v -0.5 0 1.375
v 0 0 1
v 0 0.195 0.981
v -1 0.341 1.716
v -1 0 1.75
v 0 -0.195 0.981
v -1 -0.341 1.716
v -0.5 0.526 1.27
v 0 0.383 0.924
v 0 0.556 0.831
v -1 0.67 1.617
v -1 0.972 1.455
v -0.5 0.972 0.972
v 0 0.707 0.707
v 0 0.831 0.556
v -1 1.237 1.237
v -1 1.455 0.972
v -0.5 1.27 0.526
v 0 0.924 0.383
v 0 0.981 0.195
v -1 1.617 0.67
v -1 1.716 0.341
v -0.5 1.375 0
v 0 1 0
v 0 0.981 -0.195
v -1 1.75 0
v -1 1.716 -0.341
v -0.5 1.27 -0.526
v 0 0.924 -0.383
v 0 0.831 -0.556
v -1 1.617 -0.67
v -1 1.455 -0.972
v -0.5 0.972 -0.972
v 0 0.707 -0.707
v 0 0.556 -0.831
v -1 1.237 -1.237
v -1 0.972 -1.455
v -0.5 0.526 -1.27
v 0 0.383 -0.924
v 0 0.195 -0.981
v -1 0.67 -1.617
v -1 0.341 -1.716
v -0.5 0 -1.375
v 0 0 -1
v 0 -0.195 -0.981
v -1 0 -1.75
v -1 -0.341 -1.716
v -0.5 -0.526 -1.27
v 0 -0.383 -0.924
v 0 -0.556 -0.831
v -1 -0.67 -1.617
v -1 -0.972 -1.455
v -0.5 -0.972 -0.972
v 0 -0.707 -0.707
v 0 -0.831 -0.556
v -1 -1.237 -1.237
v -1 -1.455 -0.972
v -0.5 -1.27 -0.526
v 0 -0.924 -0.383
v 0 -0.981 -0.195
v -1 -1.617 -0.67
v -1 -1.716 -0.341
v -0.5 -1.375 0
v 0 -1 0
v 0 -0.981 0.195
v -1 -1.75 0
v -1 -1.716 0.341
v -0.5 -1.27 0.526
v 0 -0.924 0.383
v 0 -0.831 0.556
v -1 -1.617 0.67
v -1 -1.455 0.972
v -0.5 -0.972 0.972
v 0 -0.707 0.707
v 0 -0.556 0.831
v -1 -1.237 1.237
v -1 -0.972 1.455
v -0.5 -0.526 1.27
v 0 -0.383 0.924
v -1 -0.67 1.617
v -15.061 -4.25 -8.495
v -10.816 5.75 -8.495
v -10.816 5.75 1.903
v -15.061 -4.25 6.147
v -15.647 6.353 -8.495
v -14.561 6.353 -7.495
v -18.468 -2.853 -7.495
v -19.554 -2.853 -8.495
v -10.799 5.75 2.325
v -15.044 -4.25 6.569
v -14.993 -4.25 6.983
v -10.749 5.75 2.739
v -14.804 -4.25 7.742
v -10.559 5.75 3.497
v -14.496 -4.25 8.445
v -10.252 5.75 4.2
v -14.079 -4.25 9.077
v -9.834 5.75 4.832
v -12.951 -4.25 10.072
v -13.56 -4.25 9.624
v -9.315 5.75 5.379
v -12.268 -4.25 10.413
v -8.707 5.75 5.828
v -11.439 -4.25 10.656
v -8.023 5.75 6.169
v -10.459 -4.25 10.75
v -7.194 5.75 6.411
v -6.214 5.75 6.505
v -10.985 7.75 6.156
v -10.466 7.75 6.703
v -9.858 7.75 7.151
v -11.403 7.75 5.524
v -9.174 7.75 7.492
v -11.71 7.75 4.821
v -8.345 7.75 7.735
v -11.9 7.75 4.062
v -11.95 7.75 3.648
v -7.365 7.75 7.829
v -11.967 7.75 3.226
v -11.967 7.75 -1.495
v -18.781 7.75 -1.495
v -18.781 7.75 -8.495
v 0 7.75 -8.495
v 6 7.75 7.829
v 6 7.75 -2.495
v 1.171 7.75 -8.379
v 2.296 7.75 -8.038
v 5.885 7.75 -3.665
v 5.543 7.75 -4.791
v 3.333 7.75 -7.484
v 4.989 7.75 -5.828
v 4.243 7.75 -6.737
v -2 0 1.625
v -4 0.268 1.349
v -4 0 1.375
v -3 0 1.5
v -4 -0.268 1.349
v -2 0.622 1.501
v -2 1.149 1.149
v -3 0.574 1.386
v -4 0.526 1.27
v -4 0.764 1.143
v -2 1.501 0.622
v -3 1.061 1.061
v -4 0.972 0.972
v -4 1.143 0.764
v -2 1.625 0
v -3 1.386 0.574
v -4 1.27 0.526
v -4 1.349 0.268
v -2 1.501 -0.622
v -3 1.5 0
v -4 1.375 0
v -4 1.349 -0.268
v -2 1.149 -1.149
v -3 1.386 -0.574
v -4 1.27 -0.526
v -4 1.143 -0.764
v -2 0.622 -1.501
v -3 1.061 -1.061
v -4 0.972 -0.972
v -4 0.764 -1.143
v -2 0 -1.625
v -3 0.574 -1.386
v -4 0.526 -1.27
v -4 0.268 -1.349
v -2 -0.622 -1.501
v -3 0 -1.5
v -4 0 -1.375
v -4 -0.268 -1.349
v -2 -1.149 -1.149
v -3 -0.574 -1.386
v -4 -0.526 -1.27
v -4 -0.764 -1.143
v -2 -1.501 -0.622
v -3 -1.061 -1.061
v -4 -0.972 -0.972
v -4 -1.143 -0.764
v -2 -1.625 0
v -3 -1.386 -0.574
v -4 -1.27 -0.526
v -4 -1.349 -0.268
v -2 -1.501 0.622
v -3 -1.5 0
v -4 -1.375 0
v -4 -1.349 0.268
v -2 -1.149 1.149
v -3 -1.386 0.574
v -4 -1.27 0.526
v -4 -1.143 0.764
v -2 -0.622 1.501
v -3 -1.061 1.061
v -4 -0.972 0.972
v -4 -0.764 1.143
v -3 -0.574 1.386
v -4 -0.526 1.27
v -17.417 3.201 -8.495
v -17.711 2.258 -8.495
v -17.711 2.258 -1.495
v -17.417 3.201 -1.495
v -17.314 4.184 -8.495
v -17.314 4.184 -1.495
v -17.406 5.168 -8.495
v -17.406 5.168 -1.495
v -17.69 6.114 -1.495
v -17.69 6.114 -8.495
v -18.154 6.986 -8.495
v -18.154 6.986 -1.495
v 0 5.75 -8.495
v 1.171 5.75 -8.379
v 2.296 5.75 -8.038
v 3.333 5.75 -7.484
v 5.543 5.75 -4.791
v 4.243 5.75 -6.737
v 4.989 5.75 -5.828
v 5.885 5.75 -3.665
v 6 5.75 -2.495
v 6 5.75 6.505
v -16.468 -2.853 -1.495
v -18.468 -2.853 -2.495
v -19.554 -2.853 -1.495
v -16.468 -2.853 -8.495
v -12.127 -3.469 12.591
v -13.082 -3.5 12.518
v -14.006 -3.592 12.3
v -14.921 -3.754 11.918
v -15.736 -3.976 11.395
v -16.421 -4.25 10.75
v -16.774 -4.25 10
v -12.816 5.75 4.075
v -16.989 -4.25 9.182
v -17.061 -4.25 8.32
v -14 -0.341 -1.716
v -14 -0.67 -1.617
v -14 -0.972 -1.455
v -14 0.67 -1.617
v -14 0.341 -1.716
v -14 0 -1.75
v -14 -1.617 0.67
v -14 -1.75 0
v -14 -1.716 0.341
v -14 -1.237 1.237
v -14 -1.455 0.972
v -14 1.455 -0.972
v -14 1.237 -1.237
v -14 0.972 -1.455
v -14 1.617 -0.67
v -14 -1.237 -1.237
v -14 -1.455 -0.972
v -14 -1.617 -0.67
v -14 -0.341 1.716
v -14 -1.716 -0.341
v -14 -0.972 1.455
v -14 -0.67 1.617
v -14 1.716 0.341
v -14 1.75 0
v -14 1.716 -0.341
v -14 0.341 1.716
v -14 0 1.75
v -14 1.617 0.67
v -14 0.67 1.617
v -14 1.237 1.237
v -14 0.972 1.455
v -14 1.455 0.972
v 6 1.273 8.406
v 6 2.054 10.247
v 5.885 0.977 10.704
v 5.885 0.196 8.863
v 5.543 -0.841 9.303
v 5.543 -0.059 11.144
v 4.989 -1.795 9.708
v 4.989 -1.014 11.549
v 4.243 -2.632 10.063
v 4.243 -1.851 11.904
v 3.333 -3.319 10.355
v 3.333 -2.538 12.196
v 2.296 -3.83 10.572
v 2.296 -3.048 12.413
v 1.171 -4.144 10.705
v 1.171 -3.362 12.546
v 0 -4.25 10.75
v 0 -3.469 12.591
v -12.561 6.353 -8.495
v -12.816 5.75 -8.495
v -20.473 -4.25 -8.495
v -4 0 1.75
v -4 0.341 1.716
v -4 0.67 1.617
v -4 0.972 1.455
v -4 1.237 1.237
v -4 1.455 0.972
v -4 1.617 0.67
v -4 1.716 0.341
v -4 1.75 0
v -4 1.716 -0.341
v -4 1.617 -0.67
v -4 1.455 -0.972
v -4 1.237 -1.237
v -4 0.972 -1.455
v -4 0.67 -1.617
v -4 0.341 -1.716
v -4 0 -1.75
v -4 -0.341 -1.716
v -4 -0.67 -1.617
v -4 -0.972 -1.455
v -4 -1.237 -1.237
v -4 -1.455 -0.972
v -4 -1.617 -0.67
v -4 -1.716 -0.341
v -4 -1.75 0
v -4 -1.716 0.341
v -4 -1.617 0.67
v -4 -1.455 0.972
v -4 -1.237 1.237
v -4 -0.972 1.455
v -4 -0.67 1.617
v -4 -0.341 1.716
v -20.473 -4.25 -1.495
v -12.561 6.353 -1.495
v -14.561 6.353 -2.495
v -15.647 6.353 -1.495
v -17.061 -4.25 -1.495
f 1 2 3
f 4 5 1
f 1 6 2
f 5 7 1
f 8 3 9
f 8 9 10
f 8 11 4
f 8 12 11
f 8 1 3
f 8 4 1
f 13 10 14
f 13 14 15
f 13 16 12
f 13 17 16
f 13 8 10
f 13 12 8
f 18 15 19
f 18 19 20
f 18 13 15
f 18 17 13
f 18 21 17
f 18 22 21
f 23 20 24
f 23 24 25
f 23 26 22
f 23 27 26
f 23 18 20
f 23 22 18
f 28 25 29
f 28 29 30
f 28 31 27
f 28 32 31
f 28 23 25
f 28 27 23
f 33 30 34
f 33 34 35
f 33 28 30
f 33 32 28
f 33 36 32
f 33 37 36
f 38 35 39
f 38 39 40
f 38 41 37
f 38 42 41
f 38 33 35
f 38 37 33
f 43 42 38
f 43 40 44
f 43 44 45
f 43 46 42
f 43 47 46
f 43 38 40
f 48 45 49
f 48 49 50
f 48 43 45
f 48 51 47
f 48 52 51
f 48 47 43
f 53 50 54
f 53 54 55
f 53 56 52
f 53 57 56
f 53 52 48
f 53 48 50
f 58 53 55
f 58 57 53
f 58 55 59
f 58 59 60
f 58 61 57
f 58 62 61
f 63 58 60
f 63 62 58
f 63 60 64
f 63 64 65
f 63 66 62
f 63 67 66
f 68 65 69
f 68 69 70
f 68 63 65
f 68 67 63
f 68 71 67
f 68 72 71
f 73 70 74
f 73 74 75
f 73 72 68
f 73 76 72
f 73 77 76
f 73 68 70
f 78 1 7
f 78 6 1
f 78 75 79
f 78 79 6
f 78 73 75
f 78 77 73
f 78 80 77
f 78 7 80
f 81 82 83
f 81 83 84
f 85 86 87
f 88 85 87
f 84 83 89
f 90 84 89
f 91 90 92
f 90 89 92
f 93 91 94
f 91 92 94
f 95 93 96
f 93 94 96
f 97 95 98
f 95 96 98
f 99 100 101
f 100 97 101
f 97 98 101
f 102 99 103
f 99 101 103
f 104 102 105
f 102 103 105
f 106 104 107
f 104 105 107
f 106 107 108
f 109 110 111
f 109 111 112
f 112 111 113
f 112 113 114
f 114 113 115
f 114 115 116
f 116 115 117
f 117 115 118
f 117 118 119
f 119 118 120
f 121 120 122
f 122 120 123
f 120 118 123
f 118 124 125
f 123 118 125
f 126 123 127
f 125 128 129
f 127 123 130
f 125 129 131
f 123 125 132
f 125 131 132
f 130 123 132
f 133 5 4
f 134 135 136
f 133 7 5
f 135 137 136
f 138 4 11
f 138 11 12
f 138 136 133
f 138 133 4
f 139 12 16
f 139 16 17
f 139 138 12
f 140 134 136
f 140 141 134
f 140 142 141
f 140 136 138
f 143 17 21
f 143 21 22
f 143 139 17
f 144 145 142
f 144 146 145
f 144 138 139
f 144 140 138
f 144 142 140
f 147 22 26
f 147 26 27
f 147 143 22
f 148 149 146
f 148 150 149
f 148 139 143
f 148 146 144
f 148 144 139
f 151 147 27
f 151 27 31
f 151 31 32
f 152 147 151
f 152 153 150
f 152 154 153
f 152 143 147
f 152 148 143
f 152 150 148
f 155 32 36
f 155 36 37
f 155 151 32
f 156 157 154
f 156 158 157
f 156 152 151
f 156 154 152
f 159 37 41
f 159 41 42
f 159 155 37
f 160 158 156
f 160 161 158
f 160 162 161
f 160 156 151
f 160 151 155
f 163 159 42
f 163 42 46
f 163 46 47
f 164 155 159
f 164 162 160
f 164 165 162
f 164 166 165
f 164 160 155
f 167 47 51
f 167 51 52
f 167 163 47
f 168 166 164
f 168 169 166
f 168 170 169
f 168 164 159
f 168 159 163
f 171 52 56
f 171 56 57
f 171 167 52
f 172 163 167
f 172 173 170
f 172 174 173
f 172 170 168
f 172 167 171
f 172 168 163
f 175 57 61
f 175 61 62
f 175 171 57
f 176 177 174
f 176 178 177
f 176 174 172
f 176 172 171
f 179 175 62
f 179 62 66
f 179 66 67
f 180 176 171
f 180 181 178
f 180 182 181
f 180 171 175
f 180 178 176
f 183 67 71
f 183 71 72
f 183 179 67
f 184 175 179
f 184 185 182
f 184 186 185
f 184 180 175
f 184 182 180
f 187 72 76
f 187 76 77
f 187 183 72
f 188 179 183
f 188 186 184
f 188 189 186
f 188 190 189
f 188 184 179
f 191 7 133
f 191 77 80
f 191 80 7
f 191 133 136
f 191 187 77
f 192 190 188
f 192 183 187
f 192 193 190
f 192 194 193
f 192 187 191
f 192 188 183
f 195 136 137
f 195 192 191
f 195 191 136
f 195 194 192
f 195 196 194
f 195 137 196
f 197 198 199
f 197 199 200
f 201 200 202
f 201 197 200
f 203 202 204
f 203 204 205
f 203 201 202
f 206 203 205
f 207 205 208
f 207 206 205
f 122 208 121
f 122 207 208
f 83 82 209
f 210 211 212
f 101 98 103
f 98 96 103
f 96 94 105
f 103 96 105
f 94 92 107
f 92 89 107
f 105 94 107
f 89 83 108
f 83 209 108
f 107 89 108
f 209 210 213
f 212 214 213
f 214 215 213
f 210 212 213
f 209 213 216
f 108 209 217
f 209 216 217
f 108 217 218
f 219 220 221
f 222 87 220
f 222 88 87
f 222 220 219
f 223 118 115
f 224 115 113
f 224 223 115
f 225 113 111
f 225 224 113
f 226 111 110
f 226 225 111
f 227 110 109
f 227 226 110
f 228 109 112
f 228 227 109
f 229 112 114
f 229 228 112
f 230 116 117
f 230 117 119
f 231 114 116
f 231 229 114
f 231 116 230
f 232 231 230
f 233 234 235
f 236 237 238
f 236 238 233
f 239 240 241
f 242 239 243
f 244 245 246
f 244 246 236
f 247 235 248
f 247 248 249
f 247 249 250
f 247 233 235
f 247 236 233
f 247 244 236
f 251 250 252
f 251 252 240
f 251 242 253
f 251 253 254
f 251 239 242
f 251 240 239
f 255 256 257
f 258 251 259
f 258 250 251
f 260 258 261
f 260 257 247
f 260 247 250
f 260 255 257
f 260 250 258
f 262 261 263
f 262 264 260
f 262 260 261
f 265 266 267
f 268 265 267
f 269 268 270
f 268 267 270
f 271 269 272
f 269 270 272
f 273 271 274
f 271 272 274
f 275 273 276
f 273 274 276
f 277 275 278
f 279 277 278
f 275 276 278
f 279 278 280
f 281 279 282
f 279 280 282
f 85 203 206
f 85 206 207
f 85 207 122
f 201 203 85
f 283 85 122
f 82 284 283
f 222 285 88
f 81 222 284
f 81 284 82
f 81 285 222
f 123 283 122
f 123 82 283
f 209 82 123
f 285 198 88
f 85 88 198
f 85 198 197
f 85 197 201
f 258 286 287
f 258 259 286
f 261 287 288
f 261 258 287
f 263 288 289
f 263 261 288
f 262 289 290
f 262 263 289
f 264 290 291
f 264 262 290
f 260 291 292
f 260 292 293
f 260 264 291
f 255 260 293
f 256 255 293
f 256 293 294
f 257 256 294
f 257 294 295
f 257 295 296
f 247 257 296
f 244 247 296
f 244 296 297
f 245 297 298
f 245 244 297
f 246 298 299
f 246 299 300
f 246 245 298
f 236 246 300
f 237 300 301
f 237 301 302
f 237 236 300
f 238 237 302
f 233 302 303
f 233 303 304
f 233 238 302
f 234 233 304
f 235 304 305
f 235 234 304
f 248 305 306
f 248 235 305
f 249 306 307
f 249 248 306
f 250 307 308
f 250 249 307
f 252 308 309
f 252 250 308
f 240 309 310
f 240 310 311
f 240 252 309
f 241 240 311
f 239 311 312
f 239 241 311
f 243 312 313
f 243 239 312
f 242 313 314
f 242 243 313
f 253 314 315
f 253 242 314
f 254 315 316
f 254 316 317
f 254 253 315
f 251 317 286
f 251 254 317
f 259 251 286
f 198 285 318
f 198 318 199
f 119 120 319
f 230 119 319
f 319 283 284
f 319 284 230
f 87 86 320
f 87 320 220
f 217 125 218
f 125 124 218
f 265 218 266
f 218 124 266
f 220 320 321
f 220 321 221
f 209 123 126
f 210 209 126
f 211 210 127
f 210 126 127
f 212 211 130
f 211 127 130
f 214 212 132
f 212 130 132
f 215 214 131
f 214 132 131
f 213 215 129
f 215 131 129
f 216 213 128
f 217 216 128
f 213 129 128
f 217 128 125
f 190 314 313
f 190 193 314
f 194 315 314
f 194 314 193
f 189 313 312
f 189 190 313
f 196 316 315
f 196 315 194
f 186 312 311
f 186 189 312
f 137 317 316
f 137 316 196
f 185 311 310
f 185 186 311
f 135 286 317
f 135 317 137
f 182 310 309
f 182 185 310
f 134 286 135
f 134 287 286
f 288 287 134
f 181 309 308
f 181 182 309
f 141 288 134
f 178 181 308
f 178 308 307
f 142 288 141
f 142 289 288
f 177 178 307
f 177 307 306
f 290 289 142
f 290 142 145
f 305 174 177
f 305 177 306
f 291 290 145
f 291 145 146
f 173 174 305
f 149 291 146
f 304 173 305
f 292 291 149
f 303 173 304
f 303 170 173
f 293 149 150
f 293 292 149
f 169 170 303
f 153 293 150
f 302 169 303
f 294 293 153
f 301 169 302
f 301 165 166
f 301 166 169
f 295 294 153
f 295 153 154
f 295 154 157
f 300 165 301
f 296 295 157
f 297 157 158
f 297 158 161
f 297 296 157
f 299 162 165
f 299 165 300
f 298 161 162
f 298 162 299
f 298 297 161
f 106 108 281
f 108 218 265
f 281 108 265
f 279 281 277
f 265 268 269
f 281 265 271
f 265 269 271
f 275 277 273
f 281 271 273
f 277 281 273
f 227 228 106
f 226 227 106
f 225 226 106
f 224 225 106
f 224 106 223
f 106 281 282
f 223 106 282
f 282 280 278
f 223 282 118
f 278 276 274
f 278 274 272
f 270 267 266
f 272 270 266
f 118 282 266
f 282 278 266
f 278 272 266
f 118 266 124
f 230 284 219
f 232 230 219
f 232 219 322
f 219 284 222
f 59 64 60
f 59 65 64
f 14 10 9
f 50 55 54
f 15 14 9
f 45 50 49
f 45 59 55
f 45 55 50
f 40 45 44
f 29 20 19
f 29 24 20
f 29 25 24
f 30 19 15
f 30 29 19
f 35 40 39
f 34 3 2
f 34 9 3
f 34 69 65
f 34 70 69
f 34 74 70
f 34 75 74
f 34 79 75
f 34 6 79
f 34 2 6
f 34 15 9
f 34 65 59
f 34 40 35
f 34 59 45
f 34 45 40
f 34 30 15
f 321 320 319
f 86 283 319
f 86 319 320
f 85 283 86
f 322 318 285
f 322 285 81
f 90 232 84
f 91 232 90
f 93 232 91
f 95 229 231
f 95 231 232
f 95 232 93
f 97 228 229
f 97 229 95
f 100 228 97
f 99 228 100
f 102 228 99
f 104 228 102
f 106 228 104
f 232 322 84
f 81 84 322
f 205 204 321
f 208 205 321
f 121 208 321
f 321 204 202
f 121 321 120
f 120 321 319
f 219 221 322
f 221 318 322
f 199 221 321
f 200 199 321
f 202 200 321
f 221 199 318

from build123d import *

# Parameters (mm, degrees)
F4_DEPTH      = 20
F4_DEPTH_BACK = 5
F6_DEPTH      = 2
F8_DEPTH      = 2
F10_DEPTH     = 25
F11_REACH     = 32.8764516567
F14_REACH     = 25.371169227
F16_DEPTH     = 7
F17_SIZE      = 1
F18_T4_DEPTH  = 33.0979417074
F18_T8_DEPTH  = 34.519175586


# Not quite as in the source:
# - a fillet or chamfer that OpenCascade refuses, or shapes differently, is made with other operations: its cross-section is extruded or revolved along the edge and cut away or added
# - a feature names something its author has since deleted; it is built from what else it names


with BuildPart() as f1:
    # F0 (on Front) → F1 (revolve)
    with BuildSketch(Plane.XZ):
        Polygon((-4, 1.75), (-14, 1.75), (-14, 0), (0, 0), (0, 1), (-1, 1.75), (-4, 1.375), align=None)
    revolve(axis=Axis((-7, 0, 0), (-1, 0, 0)))


with BuildPart() as f4:
    # F3 (on offset) → F4 (new body, two sides)
    with BuildSketch(Plane(origin=(-14, 0, 0), x_dir=(0, -1, 0), z_dir=(-1, 0, 0))) as f4_sk:
        Polygon((-5.75, 6.5052518379), (4.25, 10.75), (3.468537743, 12.5910097069), (-7.75, 7.8290229603), (-7.75, -8.4947481621), (-5.75, -8.4947481621), align=None)
    extrude(amount=-F4_DEPTH)
    extrude(f4_sk.sketch, amount=F4_DEPTH_BACK)

    # F5 (on face) → F6 (cut, through all)
    with BuildSketch(Plane(origin=(0, 7.75, 0), x_dir=(-1, 0, 0), z_dir=(0, 1, 0))):
        with BuildLine():
            ThreePointArc((0, -8.4947481621), (-4.2426406871, -6.7373888492), (-6, -2.4947481621))
            Line((-6, -2.4947481621), (-6, -8.4947481621))
            Line((-6, -8.4947481621), (0, -8.4947481621))
        make_face()
    extrude(amount=-F6_DEPTH, mode=Mode.SUBTRACT)

    # F7 (on face) → F8 (cut, through all)
    with BuildSketch(Plane(origin=(0, 3.999062721, 9.4212013724), x_dir=(1, 0, 0), z_dir=(0, 0.3907311285, 0.9205048535))):
        with BuildLine():
            ThreePointArc((6, -2.1125052584), (4.2426406871, -6.3551459456), (0, -8.1125052584))
            Line((0, -8.1125052584), (6, -8.1125052584))
            Line((6, -8.1125052584), (6, -2.1125052584))
        make_face()
    extrude(amount=-F8_DEPTH, mode=Mode.SUBTRACT)

    # F9 (on face) → F10 (cut)
    with BuildSketch(Plane(origin=(0, 0, -8.4947481621), x_dir=(1, 0, 0), z_dir=(0, 0, -1))):
        Polygon((-19, -5.75), (-12.8164388784, -5.75), (-17.0611870405, 4.25), (-19, 4.25), align=None)
        Polygon((-19, -7.75), (-11.967489246, -7.75), (-12.8164388784, -5.75), (-19, -5.75), align=None)
    extrude(amount=-F10_DEPTH, mode=Mode.SUBTRACT)

    f11_end = Plane(origin=(-4.5062197261, 2.0556087421, 10.2461486429), x_dir=(0, 0.9205048535, -0.3907311285), z_dir=(0, 0.3907311285, 0.9205048535))
    # F9 (on face) → F11 (join, up to a plane its end follows)
    with BuildSketch(Plane(origin=(0, 0, -8.4947481621), x_dir=(1, 0, 0), z_dir=(0, 0, -1))):
        Polygon((-11.967489246, -7.75), (-9.967489246, -7.75), (-10.8164388784, -5.75), (-12.8164388784, -5.75), align=None)
        Polygon((-12.8164388784, -5.75), (-10.8164388784, -5.75), (-15.0611870405, 4.25), (-17.0611870405, 4.25), align=None)
    f11_long = extrude(amount=-F11_REACH, mode=Mode.PRIVATE)
    add(split(f11_long, bisect_by=f11_end, keep=Keep.BOTTOM, mode=Mode.PRIVATE))

    f14_end = f4.faces().sort_by_distance((-14.6289155357, 1.480072579, 0.9978505439))[0]
    # F13 (on face) → F14 (cut, up to a face of the model that its end follows)
    with BuildSketch(Plane.YZ.offset(6)):
        Polygon((-4.25, 10.75), (-3.468537743, 12.5910097069), (-4.25, 12.9227207548), align=None)
    f14_long = extrude(amount=-F14_REACH, mode=Mode.PRIVATE)
    add(split(f14_long, bisect_by=f14_end, keep=Keep.BOTTOM, mode=Mode.PRIVATE), mode=Mode.SUBTRACT)

    # F15 (on face) → F16 (join)
    with BuildSketch(Plane(origin=(0, 0, -8.4947481621), x_dir=(1, 0, 0), z_dir=(0, 0, -1))):
        with BuildLine():
            Line((-15.3797577366, -7.75), (-11.967489246, -7.75))
            Line((-11.967489246, -7.75), (-12.5606825008, -6.3525242673))
            Line((-12.5606825008, -6.3525242673), (-14.5606825008, -6.3525242673))
            Line((-14.5606825008, -6.3525242673), (-18.4679937857, 2.8525242673))
            Line((-18.4679937857, 2.8525242673), (-16.4679937857, 2.8525242673))
            Line((-16.4679937857, 2.8525242673), (-17.0611870405, 4.25))
            Line((-17.0611870405, 4.25), (-20.4734555312, 4.25))
            Line((-20.4734555312, 4.25), (-17.7109944528, -2.257950467))
            ThreePointArc((-17.7109944528, -2.257950467), (-17.4057692366, -5.1676369709), (-18.7808471141, -7.75))
            Line((-18.7808471141, -7.75), (-15.3797577366, -7.75))
        make_face()
    extrude(amount=-F16_DEPTH)

    # F17
    f17_edges = [f4.edges().sort_by_distance(p)[0] for p in [
        (-16.514338, 1.75, -1.494748),
        (-16.514338, 1.75, -8.494748),
    ]]
    chamfer(f17_edges, length=F17_SIZE)

    # F18: fillet of radius 5 on 2 edges, made by hand


with BuildPart() as f18_tool2:
    # F18_s3 → F18_t4 (new body)
    with BuildSketch(Plane(origin=(3.4003281709, 8.010671166, -3.4003281709), x_dir=(0.9205048535, -0.3907311285, 0), z_dir=(-0.3639362896, -0.857380169, 0.3639362896))):
        with BuildLine():
            ThreePointArc((-12.2032884735, 2.1604142833), (-10.99912635, 5.4148904033), (-7.9666425473, 7.101799773))
            Line((-7.9666425473, 7.101799773), (-12.2032884735, 6.4473151282))
            Line((-12.2032884735, 6.4473151282), (-12.2032884735, 2.1604142833))
        make_face()
    extrude(amount=F18_T4_DEPTH)

    split(bisect_by=Plane.XZ.offset(-5.75), keep=Keep.TOP)

    split(bisect_by=Plane.XZ.offset(4.25), keep=Keep.BOTTOM)

    split(bisect_by=Plane(origin=(0, -7.467600464, 3.1698083345), x_dir=(1, 0, 0), z_dir=(0, 0.9205048535, -0.3907311285)), keep=Keep.TOP)


with BuildPart() as f4_1:
    add(f4.part)

    # F18_t1: union F18_tool2
    add(f18_tool2.part)

    # F18_s9 → F18_t8 (cut)
    with BuildSketch(Plane(origin=(-8.8661781717, -20.8874068216, 8.8661781717), x_dir=(-0.9205048535, 0.3907311285, 0), z_dir=(0.3639362896, 0.857380169, -0.3639362896))):
        with BuildLine():
            ThreePointArc((9.8076522542, 8.841121216), (12.8401360569, 7.1542118462), (14.0442981804, 3.8997357263))
            Line((14.0442981804, 3.8997357263), (14.0442981804, 8.1866365712))
            Line((14.0442981804, 8.1866365712), (9.8076522542, 8.841121216))
        make_face()
    extrude(amount=F18_T8_DEPTH, mode=Mode.SUBTRACT)


solid = Compound([f1.part, f4_1.part])
